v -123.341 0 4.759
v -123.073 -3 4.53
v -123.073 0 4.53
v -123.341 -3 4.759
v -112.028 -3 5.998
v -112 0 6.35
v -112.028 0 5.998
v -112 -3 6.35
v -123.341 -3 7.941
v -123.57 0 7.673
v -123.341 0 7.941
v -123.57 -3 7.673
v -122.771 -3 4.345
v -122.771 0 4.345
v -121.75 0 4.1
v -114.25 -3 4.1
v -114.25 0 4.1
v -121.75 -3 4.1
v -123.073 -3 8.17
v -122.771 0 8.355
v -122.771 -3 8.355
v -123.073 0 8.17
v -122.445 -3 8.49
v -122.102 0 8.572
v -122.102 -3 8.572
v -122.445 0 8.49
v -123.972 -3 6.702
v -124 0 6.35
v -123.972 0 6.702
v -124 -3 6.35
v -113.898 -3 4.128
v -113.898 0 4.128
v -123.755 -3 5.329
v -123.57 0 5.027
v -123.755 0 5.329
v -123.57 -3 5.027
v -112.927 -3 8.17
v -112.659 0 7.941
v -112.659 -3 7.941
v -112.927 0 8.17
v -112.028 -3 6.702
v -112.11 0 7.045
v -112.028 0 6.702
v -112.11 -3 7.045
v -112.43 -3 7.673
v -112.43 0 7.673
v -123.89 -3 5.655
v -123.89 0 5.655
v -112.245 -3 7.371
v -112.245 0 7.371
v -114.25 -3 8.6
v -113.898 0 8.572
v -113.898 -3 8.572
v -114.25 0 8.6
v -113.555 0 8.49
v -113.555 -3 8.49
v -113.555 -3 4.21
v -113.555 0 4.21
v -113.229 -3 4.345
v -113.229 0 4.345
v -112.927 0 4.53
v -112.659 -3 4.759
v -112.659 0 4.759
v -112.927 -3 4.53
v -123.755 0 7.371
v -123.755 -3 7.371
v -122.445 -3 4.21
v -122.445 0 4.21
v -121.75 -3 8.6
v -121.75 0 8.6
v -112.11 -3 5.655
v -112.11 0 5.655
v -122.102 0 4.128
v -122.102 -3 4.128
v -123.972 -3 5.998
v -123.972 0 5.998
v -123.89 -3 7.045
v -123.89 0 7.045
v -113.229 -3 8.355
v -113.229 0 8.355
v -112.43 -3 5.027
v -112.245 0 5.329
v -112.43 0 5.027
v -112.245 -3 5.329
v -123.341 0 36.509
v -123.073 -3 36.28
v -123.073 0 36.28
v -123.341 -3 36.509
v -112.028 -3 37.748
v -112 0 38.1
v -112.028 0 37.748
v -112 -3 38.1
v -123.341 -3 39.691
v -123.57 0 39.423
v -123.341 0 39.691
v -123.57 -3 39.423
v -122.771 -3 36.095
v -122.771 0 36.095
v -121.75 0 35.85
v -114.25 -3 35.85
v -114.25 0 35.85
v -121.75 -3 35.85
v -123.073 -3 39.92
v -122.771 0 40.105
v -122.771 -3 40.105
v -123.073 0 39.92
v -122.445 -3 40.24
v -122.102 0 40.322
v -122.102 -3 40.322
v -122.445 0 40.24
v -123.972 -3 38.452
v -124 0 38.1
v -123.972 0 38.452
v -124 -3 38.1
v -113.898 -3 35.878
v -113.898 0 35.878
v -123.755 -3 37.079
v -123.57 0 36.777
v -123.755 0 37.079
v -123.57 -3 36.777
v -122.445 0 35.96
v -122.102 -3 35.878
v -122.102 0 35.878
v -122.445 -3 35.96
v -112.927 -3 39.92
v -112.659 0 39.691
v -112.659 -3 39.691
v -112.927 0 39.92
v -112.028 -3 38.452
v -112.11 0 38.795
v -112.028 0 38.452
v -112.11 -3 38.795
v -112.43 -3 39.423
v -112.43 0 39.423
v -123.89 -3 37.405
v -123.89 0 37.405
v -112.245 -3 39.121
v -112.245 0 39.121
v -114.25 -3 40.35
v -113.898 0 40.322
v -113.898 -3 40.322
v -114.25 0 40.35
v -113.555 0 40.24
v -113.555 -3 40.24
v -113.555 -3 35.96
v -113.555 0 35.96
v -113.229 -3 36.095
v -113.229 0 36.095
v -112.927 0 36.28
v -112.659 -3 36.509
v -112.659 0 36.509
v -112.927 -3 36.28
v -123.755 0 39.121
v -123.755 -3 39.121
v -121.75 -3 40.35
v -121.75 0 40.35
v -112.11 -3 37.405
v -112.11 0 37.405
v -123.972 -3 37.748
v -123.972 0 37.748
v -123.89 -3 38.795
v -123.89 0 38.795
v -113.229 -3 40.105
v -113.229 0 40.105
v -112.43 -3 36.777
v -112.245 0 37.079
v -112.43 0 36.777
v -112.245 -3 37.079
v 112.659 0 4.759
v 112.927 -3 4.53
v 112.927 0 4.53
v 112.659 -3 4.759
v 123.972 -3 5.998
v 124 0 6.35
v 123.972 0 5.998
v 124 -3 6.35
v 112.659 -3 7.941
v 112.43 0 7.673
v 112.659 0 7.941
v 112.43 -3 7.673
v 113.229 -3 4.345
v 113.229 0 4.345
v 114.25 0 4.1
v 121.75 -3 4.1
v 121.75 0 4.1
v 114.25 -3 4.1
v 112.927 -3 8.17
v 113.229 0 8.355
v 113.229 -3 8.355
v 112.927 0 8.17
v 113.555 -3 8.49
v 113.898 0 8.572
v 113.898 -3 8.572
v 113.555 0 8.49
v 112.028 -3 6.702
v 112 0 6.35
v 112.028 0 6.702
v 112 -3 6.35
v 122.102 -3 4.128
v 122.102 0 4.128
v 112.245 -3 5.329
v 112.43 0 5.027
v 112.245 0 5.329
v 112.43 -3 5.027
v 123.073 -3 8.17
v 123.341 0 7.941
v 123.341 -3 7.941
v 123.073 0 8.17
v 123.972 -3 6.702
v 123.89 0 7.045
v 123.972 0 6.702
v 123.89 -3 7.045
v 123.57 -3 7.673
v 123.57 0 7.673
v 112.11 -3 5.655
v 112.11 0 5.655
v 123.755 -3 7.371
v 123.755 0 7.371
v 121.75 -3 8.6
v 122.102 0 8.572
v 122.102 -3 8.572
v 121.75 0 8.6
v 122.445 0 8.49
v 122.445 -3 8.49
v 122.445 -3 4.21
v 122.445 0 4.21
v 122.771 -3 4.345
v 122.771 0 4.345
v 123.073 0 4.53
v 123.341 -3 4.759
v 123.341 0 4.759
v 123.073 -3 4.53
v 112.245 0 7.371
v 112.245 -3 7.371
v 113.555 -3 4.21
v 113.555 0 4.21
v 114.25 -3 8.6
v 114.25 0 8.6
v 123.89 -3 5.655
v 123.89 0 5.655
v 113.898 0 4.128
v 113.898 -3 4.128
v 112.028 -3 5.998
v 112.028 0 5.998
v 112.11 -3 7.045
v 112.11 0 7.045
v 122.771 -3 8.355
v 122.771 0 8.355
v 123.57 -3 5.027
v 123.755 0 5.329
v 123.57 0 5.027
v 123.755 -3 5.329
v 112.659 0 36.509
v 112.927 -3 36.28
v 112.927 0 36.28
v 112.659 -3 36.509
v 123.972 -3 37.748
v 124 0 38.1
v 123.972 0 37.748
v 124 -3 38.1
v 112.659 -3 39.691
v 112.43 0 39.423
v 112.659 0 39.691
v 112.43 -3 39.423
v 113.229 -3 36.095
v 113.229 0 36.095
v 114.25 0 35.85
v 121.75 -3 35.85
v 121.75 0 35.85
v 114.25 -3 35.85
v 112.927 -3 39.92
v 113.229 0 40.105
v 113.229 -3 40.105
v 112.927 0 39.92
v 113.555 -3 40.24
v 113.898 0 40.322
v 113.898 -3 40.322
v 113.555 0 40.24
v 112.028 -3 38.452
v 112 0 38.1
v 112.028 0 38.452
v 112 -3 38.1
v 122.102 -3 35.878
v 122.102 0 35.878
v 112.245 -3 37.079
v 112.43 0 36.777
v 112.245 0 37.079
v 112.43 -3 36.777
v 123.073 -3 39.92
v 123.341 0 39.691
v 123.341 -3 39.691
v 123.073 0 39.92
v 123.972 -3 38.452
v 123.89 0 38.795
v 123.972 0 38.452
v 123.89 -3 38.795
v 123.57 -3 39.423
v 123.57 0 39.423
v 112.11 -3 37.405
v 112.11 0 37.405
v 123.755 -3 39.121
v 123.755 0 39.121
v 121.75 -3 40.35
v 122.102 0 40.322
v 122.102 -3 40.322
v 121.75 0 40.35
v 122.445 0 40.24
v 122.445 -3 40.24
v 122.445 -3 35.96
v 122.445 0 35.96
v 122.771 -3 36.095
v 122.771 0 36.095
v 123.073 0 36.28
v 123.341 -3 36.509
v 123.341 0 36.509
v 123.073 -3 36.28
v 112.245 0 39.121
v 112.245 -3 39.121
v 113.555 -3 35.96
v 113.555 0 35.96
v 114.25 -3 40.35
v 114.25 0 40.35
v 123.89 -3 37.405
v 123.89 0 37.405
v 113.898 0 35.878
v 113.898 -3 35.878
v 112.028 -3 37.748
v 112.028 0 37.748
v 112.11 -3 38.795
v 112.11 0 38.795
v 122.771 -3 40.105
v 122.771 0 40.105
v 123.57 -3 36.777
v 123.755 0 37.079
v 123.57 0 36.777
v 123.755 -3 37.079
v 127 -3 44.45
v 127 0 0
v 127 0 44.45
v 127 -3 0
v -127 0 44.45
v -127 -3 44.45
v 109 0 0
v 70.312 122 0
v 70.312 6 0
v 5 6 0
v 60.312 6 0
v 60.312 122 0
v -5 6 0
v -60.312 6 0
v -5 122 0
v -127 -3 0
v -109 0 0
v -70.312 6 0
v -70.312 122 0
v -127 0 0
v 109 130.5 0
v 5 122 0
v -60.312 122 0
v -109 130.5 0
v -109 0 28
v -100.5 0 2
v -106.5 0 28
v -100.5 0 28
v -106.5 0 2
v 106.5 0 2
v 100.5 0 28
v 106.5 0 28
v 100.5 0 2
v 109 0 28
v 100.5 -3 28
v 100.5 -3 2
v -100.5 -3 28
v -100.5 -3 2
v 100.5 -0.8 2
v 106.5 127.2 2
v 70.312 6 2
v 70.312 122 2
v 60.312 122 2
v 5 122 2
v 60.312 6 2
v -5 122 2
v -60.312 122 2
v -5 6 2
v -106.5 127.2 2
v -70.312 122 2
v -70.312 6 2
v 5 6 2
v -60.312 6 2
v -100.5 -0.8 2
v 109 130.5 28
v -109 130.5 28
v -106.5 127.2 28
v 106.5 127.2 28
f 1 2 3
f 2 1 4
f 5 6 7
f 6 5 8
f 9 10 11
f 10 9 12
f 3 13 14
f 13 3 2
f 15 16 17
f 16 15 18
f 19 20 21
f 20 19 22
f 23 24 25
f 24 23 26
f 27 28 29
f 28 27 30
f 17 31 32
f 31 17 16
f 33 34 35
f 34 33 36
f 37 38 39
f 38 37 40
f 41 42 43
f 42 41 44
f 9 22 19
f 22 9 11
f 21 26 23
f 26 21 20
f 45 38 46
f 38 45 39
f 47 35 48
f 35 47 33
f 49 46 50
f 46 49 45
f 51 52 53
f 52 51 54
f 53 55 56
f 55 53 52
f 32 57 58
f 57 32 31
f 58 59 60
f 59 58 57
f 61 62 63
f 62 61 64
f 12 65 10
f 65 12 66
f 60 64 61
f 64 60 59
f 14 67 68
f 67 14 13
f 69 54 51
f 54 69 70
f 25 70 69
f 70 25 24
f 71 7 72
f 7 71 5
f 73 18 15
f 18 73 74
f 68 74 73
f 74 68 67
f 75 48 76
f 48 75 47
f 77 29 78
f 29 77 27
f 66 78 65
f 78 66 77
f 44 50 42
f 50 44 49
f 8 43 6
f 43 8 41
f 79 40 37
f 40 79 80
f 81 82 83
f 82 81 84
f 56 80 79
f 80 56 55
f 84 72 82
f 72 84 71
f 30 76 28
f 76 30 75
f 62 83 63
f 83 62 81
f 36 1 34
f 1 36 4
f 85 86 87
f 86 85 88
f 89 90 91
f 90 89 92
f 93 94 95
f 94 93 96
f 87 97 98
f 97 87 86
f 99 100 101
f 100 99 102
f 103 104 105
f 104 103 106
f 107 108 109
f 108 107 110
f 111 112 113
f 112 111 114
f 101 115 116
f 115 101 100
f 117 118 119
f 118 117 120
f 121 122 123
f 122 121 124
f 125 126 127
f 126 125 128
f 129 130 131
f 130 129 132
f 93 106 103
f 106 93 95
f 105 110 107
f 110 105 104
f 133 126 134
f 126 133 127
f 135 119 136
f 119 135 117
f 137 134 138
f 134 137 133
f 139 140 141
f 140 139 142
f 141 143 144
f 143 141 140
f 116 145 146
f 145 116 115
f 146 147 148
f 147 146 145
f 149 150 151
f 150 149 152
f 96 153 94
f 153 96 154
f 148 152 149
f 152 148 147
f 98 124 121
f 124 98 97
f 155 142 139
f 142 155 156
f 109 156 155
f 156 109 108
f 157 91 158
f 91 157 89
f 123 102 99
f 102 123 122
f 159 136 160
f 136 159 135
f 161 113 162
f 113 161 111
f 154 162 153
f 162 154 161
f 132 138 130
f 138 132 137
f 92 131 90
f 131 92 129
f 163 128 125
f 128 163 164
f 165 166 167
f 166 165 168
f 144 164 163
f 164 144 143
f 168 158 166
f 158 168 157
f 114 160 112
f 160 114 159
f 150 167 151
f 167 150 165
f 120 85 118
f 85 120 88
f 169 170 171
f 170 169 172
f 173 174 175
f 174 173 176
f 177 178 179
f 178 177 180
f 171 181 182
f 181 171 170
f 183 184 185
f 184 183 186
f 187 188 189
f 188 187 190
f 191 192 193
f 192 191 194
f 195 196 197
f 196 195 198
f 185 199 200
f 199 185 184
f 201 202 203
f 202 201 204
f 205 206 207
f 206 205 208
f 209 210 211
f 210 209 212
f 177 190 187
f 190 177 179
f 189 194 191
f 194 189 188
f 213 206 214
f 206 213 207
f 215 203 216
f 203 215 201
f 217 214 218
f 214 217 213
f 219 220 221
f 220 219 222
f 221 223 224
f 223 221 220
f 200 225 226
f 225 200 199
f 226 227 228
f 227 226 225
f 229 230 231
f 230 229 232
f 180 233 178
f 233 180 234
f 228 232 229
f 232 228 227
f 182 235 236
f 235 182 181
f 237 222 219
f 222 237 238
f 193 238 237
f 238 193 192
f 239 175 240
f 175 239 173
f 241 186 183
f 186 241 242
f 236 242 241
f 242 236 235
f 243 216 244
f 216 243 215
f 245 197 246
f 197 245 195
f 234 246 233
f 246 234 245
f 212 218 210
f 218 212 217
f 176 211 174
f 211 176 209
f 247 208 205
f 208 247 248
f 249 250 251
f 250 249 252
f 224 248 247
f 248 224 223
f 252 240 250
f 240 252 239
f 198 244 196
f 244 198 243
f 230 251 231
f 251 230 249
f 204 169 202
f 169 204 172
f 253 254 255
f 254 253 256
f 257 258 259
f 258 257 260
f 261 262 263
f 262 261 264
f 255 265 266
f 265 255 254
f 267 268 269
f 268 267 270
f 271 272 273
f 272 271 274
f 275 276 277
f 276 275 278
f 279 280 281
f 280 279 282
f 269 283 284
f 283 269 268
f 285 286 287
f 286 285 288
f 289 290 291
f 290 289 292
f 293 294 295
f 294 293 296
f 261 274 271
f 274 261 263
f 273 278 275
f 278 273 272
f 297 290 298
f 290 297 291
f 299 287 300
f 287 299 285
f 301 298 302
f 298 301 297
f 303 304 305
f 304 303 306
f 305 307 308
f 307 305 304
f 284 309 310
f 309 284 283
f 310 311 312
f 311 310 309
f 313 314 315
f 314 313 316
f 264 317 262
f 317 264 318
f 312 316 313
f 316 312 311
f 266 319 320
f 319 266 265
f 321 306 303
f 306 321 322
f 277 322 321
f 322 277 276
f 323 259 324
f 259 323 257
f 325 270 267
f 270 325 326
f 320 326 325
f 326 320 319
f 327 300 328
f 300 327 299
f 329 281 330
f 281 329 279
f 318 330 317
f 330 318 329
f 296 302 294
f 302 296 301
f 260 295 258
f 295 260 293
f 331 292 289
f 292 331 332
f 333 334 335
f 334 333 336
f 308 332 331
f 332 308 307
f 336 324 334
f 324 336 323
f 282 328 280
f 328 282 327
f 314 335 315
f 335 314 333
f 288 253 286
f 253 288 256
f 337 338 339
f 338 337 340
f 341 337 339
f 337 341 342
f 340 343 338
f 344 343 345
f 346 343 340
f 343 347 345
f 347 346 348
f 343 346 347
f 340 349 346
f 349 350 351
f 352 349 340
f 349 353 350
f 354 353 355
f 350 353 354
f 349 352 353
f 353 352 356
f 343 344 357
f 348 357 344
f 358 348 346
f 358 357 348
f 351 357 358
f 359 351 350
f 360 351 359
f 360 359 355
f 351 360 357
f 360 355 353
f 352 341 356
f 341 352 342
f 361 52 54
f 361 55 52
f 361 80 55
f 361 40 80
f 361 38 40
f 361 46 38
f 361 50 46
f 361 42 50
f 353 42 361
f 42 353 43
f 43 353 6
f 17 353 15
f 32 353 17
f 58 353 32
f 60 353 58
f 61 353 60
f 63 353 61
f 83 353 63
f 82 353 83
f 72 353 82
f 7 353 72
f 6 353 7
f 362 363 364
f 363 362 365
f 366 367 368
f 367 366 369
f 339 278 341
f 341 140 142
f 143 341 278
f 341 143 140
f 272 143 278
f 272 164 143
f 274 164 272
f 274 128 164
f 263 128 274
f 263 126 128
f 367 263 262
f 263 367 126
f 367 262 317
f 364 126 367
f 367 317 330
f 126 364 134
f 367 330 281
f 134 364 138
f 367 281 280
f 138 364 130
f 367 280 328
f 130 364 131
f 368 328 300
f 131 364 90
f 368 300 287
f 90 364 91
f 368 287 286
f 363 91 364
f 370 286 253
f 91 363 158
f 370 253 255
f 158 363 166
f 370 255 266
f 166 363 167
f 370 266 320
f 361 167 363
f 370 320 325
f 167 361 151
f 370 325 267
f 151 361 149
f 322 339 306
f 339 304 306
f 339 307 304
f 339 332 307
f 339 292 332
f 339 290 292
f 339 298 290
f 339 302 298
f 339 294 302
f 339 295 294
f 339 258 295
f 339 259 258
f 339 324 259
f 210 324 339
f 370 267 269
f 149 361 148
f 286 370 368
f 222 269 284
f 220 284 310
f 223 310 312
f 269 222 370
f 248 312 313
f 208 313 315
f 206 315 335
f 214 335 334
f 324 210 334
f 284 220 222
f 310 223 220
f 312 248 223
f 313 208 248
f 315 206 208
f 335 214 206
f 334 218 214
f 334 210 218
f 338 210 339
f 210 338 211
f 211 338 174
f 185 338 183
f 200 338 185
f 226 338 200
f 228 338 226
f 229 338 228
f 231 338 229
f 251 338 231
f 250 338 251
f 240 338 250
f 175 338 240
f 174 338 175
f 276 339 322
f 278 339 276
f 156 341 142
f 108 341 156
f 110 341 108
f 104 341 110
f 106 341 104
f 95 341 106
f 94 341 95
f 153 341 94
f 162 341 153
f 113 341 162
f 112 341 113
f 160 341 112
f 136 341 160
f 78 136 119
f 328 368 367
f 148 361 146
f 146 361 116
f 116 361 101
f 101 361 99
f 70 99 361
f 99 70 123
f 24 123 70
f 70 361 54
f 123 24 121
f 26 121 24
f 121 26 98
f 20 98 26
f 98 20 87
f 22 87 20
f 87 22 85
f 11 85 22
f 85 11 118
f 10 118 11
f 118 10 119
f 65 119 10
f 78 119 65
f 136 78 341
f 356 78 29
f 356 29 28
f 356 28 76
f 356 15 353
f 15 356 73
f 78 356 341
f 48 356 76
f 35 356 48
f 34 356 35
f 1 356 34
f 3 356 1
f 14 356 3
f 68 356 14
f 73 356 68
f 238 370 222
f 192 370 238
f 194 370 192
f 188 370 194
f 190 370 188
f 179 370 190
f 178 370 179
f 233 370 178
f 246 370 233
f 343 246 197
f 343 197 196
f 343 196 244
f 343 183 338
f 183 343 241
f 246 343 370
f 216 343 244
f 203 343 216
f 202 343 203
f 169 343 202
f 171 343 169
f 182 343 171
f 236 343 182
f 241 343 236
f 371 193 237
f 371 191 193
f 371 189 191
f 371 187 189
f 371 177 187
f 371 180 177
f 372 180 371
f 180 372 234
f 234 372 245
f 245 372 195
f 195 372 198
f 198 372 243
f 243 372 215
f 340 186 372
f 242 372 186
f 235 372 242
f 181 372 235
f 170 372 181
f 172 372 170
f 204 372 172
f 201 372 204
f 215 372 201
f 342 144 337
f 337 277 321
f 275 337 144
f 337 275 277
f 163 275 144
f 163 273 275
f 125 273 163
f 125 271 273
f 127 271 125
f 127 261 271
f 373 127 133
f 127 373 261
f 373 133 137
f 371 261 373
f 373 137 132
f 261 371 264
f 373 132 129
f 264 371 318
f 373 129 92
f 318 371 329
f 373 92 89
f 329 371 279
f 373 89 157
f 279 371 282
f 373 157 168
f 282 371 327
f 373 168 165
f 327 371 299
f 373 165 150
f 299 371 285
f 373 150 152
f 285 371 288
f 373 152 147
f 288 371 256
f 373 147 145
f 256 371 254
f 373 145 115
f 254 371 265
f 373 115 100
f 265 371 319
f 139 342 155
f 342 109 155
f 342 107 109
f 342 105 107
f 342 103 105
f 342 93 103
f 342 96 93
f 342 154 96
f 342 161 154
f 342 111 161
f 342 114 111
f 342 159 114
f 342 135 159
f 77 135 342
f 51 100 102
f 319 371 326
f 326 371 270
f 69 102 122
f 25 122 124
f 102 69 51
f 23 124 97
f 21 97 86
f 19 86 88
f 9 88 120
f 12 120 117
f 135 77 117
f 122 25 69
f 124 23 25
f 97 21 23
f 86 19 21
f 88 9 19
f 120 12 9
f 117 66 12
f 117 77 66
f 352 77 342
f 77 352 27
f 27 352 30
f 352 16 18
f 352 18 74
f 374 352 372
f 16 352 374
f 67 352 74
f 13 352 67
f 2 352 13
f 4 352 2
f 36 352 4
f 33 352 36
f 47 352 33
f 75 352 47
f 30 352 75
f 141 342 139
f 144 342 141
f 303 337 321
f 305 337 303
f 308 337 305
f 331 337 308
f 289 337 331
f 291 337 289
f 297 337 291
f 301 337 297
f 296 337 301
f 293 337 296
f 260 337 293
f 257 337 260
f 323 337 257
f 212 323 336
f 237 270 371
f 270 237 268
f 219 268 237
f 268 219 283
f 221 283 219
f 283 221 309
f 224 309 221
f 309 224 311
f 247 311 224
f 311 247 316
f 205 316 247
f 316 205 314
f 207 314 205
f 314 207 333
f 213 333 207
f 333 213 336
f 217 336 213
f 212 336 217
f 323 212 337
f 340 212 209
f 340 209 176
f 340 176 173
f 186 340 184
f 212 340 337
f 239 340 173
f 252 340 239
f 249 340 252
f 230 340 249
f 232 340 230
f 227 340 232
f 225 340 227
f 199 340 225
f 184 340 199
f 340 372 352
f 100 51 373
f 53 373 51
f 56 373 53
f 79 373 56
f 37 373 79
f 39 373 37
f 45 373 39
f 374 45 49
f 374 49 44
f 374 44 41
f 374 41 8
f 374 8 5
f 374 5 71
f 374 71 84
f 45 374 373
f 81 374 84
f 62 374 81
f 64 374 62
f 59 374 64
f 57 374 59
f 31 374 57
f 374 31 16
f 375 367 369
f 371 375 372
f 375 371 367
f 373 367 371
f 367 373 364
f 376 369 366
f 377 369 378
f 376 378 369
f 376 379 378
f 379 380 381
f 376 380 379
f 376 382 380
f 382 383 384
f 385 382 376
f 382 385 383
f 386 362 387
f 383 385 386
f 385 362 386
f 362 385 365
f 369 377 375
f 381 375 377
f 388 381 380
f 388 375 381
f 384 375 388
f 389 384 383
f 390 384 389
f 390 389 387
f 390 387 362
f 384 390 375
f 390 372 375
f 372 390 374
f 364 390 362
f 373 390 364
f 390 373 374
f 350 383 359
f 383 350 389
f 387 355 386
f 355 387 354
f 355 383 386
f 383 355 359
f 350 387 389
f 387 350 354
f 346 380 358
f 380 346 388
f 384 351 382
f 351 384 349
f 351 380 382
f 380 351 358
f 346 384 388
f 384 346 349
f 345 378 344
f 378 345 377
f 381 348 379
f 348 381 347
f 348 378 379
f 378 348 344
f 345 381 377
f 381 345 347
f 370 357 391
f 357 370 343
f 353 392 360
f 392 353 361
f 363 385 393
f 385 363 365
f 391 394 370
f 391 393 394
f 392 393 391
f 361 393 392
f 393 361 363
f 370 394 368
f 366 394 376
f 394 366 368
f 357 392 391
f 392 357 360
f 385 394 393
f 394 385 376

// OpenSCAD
// =============================================================================
//  Flat 1U shelf generator for 10" racks (DeskPi RackMate)
//
//  Devices lie FLAT (on their largest face), ports/LEDs facing the rack front
//  through a faceplate window. One or more devices sit side by side per shelf.
//  Reuses the same rack faceplate + forgiving mounting slots as rack_mount.scad.
//
//    openscad -D shelf=\"ls1210gp\"            -o ls1210gp_shelf.stl flat_shelf.scad
//    openscad -D shelf=\"combo\"               -o minipc_ht801_shelf.stl flat_shelf.scad
//    openscad -D shelf=\"ls1210gp\" -D panel_w=250 -D slot_len=8 ...   (A1 one-piece)
//    openscad -D shelf=\"ls1210gp\" -D show_dev=true ...               (ghost preview)
// =============================================================================

shelf = "ls1210gp";

// ---- Device table (laid FLAT): [ name, width(across), depth, height ] -------
DEV = [
    [ "ls1210gp", 209, 126, 26   ],   // 8-port PoE switch
    [ "sg1005d",  140, 88,  23   ],   // 5-port switch
    [ "n100",     136, 125, 40   ],   // N100 router
    [ "cm3500",   145, 135, 44   ],   // modem (laid on its side)
    [ "minipc",   120, 115, 43   ],   // mini-PC
    [ "ht801",    100, 100, 29.5 ],   // ATA
];

// ---- Shelves : [ name, [device(s) side by side], back-mode ] ----------------
//   back = "wall" (solid stop, front-port devices) | "open" (rear-port devices)
SHELVES = [
    [ "ls1210gp", [ "ls1210gp" ], "wall" ],   // PoE switch, front ports
    [ "sg1005d",  [ "sg1005d"  ], "wall" ],   // 5-port switch, front ports
    [ "n100",     [ "n100"     ], "open" ],   // rear ETH/DC/COM
    [ "cm3500",   [ "cm3500"   ], "open" ],   // rear ports
    [ "minipc",   [ "minipc"   ], "open" ],   // rear ports
    [ "ht801",    [ "ht801"    ], "open" ],   // rear ports
];

// ---- 10" rack interface  *** VERIFY ***  ------------------------------------
u_mm     = 44.45;
panel_w  = 254;     // use 250 to print one-piece on a 256 bed
hole_dx  = 236;
edge_z   = 6.35;
screw_d  = 4.5;
slot_len = 12;      // use 8 for a 250mm panel

// ---- Structure --------------------------------------------------------------
clr       = 2.0;
face_t    = 3.0;
base      = 2.0;    // thin floor so a ~43mm device still fits ~1U
wall      = 2.5;
front_lip = 4.0;
ledge     = 6.0;
ov        = 0.8;

show_dev = false;
$fn = 40;

// ---- Resolve shelf ----------------------------------------------------------
srow  = SHELVES[search([shelf], SHELVES)[0]];
items = srow[1];
back  = srow[2];
function dev(name) = DEV[search([name], DEV)[0]];
function dw(i) = dev(items[i])[1];
function dd(i) = dev(items[i])[2];
function dh(i) = dev(items[i])[3];

n      = len(items);
maxh   = max([ for (i=[0:n-1]) dh(i) ]);
maxd   = max([ for (i=[0:n-1]) dd(i) ]);
panel_h = max(u_mm, ceil(maxh / u_mm) * u_mm);
tray_d  = maxd + clr;

// bay widths and X positions (side by side)
bayw   = [ for (i=[0:n-1]) dw(i) + 2*clr ];
totalw = wall + sum_to(n) ;
function sum_to(k) = (k==0) ? 0 : bayw[k-1] + wall + sum_to(k-1);
function bx0(i)    = -totalw/2 + wall + (i==0 ? 0 : sum_partial(i));
function sum_partial(i) = (i==0) ? 0 : bayw[i-1] + wall + sum_partial(i-1);
function bcx(i)    = bx0(i) + bayw[i]/2;     // bay center X

// =============================================================================
//  Helpers
// =============================================================================
module xslot(len, d, depth) {
    hull() for (s = [-1, 1])
        translate([s*(len - d)/2, 0, 0])
            rotate([-90, 0, 0]) cylinder(d = d, h = depth);
}

// =============================================================================
//  Parts
// =============================================================================
module faceplate() {
    difference() {
        translate([-panel_w/2, -face_t, 0]) cube([panel_w, face_t, panel_h]);
        for (i = [0:n-1]) {
            w = dw(i) - 2*front_lip;
            translate([bcx(i) - w/2, -face_t - 1, base])
                cube([w, face_t + 2, min(dh(i), panel_h - base)]);
        }
        for (sx = [-1, 1], sz = [edge_z, panel_h - edge_z])
            translate([sx*hole_dx/2, -face_t - 1, sz])
                xslot(slot_len, screw_d, face_t + 2);
    }
}

module tray() {
    // Floor with vent slots, one bay region per device
    difference() {
        translate([-totalw/2, -ov, 0]) cube([totalw, tray_d + ov, base]);
        for (i = [0:n-1])
            for (gx = [-1:1:1])
                translate([bcx(i) + gx*(dw(i)/3.2) - 5, ledge, -1])
                    cube([10, tray_d - 2*ledge, base + 2]);
    }
    // Side walls + dividers between bays (height = each device, capped at panel)
    for (i = [0:n]) {
        h = (i == 0) ? dh(0) : (i == n ? dh(n-1) : max(dh(i-1), dh(i)));
        x = (i == 0) ? -totalw/2 : (i == n ? totalw/2 - wall : bx0(i) - wall);
        translate([x, -ov, 0]) cube([wall, tray_d + ov, min(base + h, panel_h)]);
    }
    // Back stop
    if (back == "wall")
        translate([-totalw/2, tray_d - ov, 0])
            cube([totalw, wall + ov, min(base + maxh, panel_h)]);
}

module ghost() {
    color([0.25, 0.4, 0.55, 0.45])
        for (i = [0:n-1])
            translate([bcx(i) - dw(i)/2, 0, base])
                cube([dw(i), dd(i), dh(i)]);
}

color([0.85, 0.85, 0.88]) { faceplate(); tray(); }
if (show_dev) ghost();
